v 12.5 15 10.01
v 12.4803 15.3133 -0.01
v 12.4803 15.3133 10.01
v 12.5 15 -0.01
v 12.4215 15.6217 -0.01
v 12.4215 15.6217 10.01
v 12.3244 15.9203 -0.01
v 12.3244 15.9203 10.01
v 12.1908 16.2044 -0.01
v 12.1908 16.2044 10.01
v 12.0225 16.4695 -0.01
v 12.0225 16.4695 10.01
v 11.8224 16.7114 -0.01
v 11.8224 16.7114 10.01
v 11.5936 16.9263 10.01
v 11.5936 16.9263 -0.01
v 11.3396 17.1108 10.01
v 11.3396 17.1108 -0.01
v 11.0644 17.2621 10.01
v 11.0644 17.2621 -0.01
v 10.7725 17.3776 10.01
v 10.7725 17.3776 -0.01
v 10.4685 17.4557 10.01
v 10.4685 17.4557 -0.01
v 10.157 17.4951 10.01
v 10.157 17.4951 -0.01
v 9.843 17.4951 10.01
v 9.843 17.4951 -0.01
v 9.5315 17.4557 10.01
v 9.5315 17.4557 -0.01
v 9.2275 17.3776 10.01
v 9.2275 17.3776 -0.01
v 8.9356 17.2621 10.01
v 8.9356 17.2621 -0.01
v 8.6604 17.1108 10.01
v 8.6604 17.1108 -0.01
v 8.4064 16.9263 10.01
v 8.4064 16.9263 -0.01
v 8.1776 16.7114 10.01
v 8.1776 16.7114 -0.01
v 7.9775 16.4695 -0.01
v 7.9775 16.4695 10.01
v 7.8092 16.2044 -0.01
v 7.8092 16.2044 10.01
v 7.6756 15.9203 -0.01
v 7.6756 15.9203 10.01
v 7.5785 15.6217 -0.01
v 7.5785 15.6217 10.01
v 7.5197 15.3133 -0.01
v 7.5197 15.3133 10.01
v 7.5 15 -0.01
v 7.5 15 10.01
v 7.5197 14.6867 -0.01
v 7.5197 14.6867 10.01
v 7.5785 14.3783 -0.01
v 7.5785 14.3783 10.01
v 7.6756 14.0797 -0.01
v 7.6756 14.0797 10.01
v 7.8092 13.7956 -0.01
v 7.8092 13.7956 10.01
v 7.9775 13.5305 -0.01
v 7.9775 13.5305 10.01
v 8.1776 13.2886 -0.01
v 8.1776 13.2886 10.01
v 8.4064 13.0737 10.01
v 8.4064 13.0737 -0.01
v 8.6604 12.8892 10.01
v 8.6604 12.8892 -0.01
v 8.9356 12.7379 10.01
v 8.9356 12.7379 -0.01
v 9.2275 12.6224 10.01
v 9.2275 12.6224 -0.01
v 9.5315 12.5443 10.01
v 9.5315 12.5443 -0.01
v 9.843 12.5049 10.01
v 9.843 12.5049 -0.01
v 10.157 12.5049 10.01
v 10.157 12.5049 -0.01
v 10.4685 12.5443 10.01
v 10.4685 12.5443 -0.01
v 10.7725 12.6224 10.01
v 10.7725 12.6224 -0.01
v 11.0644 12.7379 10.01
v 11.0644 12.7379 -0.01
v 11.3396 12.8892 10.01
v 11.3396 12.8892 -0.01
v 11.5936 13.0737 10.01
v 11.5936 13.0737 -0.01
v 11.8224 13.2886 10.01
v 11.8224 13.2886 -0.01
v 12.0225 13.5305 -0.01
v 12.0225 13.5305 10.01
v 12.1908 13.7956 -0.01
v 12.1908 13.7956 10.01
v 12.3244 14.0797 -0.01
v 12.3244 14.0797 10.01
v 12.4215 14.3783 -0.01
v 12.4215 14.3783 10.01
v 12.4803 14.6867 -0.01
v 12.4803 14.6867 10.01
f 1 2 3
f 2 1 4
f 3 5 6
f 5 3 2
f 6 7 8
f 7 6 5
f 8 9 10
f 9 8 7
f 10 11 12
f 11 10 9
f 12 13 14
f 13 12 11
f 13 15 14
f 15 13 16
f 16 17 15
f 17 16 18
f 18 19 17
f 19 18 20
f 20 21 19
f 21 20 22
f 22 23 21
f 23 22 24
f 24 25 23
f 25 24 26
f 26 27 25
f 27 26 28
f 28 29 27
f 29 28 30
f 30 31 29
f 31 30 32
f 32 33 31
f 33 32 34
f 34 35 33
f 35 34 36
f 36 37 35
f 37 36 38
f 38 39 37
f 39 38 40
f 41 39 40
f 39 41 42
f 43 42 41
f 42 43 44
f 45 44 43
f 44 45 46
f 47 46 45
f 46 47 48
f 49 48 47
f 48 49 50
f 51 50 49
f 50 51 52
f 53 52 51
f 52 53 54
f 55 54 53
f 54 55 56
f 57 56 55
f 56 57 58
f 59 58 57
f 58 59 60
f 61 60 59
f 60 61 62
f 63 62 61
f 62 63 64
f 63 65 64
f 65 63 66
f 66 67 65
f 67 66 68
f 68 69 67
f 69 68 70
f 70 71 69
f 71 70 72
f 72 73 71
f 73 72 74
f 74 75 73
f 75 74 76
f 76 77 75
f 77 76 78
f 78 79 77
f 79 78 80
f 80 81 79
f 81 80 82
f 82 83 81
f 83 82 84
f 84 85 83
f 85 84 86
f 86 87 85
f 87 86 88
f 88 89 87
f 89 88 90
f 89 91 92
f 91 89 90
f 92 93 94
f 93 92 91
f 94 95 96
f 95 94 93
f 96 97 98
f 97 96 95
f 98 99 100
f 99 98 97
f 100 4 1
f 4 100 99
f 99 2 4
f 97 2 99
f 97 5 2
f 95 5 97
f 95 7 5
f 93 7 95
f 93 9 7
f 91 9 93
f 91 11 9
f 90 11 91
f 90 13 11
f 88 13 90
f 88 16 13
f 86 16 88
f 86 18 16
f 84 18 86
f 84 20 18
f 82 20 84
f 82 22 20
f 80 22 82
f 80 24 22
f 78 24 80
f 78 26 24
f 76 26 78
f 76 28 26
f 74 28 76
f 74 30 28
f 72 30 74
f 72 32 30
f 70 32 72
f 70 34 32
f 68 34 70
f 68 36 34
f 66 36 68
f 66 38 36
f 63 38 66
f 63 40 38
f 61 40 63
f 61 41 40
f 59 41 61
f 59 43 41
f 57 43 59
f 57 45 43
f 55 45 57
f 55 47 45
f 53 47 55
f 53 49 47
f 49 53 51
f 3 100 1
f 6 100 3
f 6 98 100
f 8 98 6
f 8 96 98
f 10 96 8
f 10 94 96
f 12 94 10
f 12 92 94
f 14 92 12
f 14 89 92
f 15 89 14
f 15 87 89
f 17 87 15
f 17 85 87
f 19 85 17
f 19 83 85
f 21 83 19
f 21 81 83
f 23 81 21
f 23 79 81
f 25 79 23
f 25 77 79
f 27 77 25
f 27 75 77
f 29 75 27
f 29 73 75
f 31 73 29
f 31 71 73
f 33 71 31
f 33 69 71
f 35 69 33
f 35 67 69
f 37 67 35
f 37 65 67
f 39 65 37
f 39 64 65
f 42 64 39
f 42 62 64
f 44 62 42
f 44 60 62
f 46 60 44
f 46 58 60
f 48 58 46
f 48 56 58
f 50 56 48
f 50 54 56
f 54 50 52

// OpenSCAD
// Round Hole

// Defaults

gRes = 50;
gNudge = 0.01;

module RoundHole(
	PosX,	// drill position x
	PosY,	// drill position y
	Dia,		// drill diameter
	Depth,	// drill depth
	Res = gRes,		// render resolution
	Nudge = gNudge)	// render error compensation
	{
	translate([PosX,PosY,-Nudge]) 
	cylinder(h = Nudge + Depth + Nudge, d = Dia, $fn = Res);
	}

RoundHole(10,15,5,10);
